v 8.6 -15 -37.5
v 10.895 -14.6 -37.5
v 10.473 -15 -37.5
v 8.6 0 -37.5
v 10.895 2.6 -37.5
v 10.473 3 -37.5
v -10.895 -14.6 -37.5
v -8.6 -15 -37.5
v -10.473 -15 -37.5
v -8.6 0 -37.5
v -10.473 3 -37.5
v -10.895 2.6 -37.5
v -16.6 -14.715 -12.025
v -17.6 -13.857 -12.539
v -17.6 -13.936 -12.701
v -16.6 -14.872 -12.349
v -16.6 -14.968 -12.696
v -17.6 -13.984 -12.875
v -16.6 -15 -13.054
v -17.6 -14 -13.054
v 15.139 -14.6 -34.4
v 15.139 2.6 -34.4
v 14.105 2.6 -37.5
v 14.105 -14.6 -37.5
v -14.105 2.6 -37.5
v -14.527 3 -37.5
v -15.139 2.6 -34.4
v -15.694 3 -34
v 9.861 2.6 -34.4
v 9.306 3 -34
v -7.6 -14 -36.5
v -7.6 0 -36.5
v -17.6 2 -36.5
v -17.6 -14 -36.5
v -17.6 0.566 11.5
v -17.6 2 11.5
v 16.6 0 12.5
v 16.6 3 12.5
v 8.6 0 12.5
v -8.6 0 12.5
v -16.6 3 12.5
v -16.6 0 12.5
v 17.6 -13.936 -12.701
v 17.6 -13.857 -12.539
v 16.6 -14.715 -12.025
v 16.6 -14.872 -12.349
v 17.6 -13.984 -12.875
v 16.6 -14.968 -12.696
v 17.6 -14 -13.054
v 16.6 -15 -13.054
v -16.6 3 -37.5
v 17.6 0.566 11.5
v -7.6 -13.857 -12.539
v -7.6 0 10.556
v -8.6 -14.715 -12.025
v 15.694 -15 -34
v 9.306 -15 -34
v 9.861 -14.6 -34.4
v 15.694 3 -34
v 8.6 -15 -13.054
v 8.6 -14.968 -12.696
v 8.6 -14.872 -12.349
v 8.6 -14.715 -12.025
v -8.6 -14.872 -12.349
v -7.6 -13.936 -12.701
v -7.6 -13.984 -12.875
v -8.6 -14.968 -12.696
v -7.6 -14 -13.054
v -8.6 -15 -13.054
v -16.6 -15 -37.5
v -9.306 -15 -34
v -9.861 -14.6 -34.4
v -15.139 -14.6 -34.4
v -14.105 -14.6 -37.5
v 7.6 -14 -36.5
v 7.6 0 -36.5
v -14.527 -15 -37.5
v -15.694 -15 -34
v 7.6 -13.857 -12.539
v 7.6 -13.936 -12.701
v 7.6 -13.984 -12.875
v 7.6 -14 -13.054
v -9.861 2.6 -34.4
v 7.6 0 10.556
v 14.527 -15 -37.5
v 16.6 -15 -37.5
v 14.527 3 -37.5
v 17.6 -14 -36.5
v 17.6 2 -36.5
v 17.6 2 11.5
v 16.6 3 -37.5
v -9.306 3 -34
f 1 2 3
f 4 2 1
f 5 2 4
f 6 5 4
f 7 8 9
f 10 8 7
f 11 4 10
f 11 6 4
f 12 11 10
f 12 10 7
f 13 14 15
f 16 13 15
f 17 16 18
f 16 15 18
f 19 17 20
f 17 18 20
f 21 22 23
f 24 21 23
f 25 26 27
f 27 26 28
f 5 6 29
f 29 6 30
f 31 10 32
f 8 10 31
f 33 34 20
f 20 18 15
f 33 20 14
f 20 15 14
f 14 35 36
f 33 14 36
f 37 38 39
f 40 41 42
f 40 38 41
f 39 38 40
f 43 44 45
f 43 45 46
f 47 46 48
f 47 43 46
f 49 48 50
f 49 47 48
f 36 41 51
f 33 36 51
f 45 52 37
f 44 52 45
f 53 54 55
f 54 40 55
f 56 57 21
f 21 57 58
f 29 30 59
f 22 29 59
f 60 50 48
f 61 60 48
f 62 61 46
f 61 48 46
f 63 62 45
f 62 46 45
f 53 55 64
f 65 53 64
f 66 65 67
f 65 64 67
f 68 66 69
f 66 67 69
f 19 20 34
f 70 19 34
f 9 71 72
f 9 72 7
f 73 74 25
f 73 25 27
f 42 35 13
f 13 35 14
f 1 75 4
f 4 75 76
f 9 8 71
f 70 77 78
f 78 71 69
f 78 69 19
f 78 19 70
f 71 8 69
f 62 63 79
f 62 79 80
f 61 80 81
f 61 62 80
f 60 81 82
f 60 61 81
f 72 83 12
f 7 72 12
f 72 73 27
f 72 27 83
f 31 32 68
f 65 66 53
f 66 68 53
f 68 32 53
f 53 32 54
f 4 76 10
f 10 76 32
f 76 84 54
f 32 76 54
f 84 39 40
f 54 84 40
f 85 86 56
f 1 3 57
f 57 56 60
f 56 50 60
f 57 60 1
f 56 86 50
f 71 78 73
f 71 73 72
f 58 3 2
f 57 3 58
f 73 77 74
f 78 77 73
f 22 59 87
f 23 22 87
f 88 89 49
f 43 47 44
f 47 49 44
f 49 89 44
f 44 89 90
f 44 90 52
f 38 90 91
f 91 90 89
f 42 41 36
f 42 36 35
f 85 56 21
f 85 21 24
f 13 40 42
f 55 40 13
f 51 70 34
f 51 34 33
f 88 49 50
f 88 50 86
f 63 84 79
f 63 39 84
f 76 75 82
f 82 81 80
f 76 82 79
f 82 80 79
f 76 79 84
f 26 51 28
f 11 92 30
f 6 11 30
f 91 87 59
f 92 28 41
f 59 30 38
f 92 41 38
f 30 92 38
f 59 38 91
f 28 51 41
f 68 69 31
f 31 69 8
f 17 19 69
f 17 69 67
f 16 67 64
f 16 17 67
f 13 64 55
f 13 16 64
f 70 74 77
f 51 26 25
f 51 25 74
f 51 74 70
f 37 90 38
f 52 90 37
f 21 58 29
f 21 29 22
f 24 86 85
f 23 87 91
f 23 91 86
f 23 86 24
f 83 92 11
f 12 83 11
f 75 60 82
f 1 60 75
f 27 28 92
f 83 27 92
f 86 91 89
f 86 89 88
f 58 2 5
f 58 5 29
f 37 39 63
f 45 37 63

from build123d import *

# Parameters (mm, degrees)
SKETCH_1_W          = 15.2
SKETCH_1_H          = 25
EXTRUDE_1_DEPTH     = 3
EXTRUDE_3_DEPTH     = 10
EXTRUDE_4_DEPTH     = 25
CUT_EXTRUDE_1_DEPTH = 18
FILLET_2_R          = 2
CHAMFER_1_SIZE      = 1
CHAMFER_2_SIZE      = 0.4


with BuildPart() as part:
    # 草图1 → 凸台-拉伸1 (new body)
    with BuildSketch(Plane(origin=(0, 0, 0), x_dir=(1, 0, 0), z_dir=(0, 1, 0))):
        Rectangle(SKETCH_1_W, SKETCH_1_H)
    extrude(amount=EXTRUDE_1_DEPTH)

    # 草图4 → 凸台-拉伸3 (add)
    with BuildSketch(Plane.ZY.offset(7.6)):
        Polygon((-12.5, -15), (-12.5, 3), (12.5, 3), (12.5, 0), align=None)
    extrude_3 = extrude(amount=EXTRUDE_3_DEPTH)

    # 镜向4: 凸台-拉伸3 across plane
    add(extrude_3.mirror(Plane(origin=(0, 0, 0), x_dir=(0, 0, 1), z_dir=(1, 0, 0))))

    # 草图5 → 凸台-拉伸4 (add)
    with BuildSketch(Plane(origin=(0, 0, -12.5), x_dir=(-1, 0, 0), z_dir=(0, 0, -1))):
        Polygon((7.6, 0), (7.6, -15), (17.6, -15), (17.6, 3), (-17.6, 3), (-17.6, -15), (-7.6, -15), (-7.6, 0), align=None)
    extrude(amount=EXTRUDE_4_DEPTH)

    # 草图6 → 切除-拉伸1 (cut)
    with BuildSketch(Plane(origin=(0, 3, 0), x_dir=(1, 0, 0), z_dir=(0, 1, 0))):
        Polygon((14.072075922, 37.6), (10.927924078, 37.6), (9.861257411, 34.4), (15.138742589, 34.4), align=None)
        Polygon((-14.072075922, 37.6), (-15.138742589, 34.4), (-9.861257411, 34.4), (-10.927924078, 37.6), align=None)
    extrude(amount=-CUT_EXTRUDE_1_DEPTH, mode=Mode.SUBTRACT)

    # 圆角2
    fillet_2_edges = [part.edges().sort_by_distance(p)[0] for p in [
        (-12.6, -15, -12.5),
        (12.6, -15, -12.5),
    ]]
    fillet(fillet_2_edges, radius=FILLET_2_R)

    # 倒角1
    chamfer_1_edges = [part.edges().sort_by_distance(p)[0] for p in [
        (-7.6, -7.357492926, 0.23751179),
        (-17.6, -7.357492926, 0.23751179),
        (-7.6, -14.927429856, -12.520100766),
        (-17.6, -14.927429856, -12.520100766),
        (7.6, -7.357492926, 0.23751179),
        (7.6, -14.927429856, -12.520100766),
        (17.6, -7.357492926, 0.23751179),
        (17.6, -14.927429856, -12.520100766),
        (-17.6, 1.5, 12.5),
        (-17.6, 3, -12.5),
        (17.6, 3, -12.5),
        (17.6, 1.5, 12.5),
        (7.6, -15, -25.276983965),
        (-7.6, -15, -25.276983965),
        (-17.6, -15, -25.276983965),
        (17.6, -15, -25.276983965),
        (7.6, -7.5, -37.5),
        (-7.6, -7.5, -37.5),
        (-17.6, -6, -37.5),
        (17.6, -6, -37.5),
    ]]
    chamfer(chamfer_1_edges, length=CHAMFER_1_SIZE)

    # 倒角2
    chamfer_2_edges = [part.edges().sort_by_distance(p)[0] for p in [
        (10.377924078, 3, -35.95),
        (12.5, 3, -34.4),
        (14.622075922, 3, -35.95),
        (14.622075922, -15, -35.95),
        (12.5, -15, -34.4),
        (10.377924078, -15, -35.95),
        (-14.622075922, 3, -35.95),
        (-12.5, 3, -34.4),
        (-10.377924078, 3, -35.95),
        (-10.377924078, -15, -35.95),
        (-12.5, -15, -34.4),
        (-14.622075922, -15, -35.95),
    ]]
    chamfer(chamfer_2_edges, length=CHAMFER_2_SIZE)


solid = part.part
